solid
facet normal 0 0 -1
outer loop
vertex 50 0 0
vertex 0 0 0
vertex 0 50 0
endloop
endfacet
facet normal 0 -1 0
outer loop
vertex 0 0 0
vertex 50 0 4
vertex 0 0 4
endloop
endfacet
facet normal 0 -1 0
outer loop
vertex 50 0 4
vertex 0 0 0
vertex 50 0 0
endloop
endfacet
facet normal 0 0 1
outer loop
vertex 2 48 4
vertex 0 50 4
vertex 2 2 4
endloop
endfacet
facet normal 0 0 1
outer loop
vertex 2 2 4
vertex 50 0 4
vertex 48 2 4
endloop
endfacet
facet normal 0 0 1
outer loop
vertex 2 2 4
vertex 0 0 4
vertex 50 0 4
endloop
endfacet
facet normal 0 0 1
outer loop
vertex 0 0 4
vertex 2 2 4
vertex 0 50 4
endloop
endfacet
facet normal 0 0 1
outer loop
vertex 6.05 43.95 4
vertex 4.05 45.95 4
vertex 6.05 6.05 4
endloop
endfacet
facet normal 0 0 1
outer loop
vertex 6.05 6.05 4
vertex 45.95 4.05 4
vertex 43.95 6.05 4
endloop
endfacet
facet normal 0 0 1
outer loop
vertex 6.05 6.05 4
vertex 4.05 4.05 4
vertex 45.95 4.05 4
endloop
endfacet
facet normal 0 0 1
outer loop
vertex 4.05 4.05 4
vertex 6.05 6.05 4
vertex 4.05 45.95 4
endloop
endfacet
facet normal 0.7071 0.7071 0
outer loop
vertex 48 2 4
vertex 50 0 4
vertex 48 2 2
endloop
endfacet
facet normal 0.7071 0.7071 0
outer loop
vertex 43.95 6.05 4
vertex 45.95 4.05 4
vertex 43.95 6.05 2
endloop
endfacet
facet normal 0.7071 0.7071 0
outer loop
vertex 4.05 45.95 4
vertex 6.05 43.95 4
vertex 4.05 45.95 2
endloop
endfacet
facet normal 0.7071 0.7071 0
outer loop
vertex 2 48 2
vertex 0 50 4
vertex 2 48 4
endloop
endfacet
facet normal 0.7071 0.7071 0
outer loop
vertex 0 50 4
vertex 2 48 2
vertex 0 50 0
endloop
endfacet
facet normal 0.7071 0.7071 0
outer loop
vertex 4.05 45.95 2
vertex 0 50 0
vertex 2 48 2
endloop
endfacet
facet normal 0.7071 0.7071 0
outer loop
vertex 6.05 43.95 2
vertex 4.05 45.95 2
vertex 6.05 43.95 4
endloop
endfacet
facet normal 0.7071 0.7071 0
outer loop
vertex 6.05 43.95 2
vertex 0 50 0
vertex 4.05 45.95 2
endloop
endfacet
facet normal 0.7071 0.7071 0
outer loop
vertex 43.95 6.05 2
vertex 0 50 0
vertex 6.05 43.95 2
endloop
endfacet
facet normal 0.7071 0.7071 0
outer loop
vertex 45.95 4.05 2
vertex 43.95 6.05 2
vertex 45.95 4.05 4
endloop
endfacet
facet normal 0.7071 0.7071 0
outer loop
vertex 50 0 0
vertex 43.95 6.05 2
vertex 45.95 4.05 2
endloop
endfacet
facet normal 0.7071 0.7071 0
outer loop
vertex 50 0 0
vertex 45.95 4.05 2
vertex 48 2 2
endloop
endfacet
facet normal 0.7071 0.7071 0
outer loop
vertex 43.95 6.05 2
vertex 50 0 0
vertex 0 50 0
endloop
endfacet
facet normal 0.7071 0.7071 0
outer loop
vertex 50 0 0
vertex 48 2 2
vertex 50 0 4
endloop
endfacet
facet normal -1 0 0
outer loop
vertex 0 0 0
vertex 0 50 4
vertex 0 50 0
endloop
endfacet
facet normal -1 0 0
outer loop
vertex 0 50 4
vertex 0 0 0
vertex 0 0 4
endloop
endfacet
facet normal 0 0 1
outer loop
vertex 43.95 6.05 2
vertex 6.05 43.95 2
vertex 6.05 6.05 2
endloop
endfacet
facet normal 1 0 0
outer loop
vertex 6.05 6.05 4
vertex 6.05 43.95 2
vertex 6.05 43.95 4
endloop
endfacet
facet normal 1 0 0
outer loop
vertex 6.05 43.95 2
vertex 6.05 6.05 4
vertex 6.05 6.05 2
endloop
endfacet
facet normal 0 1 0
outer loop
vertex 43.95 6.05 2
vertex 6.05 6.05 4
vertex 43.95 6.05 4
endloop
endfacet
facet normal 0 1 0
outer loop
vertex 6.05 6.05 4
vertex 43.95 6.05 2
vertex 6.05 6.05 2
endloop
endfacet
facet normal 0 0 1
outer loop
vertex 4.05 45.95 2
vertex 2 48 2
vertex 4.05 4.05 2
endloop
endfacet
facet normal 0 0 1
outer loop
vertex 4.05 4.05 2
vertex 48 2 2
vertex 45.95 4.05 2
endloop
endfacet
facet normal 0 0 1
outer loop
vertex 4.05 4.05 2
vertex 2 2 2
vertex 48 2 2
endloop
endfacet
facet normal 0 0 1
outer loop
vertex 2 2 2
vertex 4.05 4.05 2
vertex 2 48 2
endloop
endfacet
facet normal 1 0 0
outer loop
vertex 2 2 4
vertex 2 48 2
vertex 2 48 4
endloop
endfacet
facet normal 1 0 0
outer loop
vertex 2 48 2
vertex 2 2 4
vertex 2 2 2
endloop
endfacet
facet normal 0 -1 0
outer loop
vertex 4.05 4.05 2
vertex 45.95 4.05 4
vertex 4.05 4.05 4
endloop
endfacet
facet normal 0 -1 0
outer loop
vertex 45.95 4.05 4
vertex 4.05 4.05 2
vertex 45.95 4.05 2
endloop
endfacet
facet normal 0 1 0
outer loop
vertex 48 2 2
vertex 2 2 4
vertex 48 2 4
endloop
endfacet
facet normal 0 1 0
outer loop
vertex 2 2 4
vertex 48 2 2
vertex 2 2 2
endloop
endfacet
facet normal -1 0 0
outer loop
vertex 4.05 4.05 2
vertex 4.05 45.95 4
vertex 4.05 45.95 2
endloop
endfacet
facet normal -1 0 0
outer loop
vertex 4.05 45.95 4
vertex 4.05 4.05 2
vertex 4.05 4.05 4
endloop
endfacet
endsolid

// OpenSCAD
sheet_thickness = 2.05;
wall_thickness = 2;

cutout_offset = (wall_thickness * 2) + sheet_thickness;

bracket_edge_length = 50;

module right_triangle(x, y, height) {
    // Define the vertices of the right triangle
    vertices = [[0, 0], [x, 0], [0, y]];

    // Create the 2D polygon 
    linear_extrude(height) {
        polygon(vertices); 
    }
} 


difference() {
    right_triangle(x = bracket_edge_length, y = bracket_edge_length, height = 4); 

    translate([cutout_offset, cutout_offset, wall_thickness]) {
        cube(bracket_edge_length);
    }

    translate([wall_thickness, wall_thickness, wall_thickness]) {
        cube([bracket_edge_length, sheet_thickness, 12]);
    }

    translate([wall_thickness, wall_thickness, wall_thickness]) {
        cube([sheet_thickness, bracket_edge_length, 12]);
    }
}
